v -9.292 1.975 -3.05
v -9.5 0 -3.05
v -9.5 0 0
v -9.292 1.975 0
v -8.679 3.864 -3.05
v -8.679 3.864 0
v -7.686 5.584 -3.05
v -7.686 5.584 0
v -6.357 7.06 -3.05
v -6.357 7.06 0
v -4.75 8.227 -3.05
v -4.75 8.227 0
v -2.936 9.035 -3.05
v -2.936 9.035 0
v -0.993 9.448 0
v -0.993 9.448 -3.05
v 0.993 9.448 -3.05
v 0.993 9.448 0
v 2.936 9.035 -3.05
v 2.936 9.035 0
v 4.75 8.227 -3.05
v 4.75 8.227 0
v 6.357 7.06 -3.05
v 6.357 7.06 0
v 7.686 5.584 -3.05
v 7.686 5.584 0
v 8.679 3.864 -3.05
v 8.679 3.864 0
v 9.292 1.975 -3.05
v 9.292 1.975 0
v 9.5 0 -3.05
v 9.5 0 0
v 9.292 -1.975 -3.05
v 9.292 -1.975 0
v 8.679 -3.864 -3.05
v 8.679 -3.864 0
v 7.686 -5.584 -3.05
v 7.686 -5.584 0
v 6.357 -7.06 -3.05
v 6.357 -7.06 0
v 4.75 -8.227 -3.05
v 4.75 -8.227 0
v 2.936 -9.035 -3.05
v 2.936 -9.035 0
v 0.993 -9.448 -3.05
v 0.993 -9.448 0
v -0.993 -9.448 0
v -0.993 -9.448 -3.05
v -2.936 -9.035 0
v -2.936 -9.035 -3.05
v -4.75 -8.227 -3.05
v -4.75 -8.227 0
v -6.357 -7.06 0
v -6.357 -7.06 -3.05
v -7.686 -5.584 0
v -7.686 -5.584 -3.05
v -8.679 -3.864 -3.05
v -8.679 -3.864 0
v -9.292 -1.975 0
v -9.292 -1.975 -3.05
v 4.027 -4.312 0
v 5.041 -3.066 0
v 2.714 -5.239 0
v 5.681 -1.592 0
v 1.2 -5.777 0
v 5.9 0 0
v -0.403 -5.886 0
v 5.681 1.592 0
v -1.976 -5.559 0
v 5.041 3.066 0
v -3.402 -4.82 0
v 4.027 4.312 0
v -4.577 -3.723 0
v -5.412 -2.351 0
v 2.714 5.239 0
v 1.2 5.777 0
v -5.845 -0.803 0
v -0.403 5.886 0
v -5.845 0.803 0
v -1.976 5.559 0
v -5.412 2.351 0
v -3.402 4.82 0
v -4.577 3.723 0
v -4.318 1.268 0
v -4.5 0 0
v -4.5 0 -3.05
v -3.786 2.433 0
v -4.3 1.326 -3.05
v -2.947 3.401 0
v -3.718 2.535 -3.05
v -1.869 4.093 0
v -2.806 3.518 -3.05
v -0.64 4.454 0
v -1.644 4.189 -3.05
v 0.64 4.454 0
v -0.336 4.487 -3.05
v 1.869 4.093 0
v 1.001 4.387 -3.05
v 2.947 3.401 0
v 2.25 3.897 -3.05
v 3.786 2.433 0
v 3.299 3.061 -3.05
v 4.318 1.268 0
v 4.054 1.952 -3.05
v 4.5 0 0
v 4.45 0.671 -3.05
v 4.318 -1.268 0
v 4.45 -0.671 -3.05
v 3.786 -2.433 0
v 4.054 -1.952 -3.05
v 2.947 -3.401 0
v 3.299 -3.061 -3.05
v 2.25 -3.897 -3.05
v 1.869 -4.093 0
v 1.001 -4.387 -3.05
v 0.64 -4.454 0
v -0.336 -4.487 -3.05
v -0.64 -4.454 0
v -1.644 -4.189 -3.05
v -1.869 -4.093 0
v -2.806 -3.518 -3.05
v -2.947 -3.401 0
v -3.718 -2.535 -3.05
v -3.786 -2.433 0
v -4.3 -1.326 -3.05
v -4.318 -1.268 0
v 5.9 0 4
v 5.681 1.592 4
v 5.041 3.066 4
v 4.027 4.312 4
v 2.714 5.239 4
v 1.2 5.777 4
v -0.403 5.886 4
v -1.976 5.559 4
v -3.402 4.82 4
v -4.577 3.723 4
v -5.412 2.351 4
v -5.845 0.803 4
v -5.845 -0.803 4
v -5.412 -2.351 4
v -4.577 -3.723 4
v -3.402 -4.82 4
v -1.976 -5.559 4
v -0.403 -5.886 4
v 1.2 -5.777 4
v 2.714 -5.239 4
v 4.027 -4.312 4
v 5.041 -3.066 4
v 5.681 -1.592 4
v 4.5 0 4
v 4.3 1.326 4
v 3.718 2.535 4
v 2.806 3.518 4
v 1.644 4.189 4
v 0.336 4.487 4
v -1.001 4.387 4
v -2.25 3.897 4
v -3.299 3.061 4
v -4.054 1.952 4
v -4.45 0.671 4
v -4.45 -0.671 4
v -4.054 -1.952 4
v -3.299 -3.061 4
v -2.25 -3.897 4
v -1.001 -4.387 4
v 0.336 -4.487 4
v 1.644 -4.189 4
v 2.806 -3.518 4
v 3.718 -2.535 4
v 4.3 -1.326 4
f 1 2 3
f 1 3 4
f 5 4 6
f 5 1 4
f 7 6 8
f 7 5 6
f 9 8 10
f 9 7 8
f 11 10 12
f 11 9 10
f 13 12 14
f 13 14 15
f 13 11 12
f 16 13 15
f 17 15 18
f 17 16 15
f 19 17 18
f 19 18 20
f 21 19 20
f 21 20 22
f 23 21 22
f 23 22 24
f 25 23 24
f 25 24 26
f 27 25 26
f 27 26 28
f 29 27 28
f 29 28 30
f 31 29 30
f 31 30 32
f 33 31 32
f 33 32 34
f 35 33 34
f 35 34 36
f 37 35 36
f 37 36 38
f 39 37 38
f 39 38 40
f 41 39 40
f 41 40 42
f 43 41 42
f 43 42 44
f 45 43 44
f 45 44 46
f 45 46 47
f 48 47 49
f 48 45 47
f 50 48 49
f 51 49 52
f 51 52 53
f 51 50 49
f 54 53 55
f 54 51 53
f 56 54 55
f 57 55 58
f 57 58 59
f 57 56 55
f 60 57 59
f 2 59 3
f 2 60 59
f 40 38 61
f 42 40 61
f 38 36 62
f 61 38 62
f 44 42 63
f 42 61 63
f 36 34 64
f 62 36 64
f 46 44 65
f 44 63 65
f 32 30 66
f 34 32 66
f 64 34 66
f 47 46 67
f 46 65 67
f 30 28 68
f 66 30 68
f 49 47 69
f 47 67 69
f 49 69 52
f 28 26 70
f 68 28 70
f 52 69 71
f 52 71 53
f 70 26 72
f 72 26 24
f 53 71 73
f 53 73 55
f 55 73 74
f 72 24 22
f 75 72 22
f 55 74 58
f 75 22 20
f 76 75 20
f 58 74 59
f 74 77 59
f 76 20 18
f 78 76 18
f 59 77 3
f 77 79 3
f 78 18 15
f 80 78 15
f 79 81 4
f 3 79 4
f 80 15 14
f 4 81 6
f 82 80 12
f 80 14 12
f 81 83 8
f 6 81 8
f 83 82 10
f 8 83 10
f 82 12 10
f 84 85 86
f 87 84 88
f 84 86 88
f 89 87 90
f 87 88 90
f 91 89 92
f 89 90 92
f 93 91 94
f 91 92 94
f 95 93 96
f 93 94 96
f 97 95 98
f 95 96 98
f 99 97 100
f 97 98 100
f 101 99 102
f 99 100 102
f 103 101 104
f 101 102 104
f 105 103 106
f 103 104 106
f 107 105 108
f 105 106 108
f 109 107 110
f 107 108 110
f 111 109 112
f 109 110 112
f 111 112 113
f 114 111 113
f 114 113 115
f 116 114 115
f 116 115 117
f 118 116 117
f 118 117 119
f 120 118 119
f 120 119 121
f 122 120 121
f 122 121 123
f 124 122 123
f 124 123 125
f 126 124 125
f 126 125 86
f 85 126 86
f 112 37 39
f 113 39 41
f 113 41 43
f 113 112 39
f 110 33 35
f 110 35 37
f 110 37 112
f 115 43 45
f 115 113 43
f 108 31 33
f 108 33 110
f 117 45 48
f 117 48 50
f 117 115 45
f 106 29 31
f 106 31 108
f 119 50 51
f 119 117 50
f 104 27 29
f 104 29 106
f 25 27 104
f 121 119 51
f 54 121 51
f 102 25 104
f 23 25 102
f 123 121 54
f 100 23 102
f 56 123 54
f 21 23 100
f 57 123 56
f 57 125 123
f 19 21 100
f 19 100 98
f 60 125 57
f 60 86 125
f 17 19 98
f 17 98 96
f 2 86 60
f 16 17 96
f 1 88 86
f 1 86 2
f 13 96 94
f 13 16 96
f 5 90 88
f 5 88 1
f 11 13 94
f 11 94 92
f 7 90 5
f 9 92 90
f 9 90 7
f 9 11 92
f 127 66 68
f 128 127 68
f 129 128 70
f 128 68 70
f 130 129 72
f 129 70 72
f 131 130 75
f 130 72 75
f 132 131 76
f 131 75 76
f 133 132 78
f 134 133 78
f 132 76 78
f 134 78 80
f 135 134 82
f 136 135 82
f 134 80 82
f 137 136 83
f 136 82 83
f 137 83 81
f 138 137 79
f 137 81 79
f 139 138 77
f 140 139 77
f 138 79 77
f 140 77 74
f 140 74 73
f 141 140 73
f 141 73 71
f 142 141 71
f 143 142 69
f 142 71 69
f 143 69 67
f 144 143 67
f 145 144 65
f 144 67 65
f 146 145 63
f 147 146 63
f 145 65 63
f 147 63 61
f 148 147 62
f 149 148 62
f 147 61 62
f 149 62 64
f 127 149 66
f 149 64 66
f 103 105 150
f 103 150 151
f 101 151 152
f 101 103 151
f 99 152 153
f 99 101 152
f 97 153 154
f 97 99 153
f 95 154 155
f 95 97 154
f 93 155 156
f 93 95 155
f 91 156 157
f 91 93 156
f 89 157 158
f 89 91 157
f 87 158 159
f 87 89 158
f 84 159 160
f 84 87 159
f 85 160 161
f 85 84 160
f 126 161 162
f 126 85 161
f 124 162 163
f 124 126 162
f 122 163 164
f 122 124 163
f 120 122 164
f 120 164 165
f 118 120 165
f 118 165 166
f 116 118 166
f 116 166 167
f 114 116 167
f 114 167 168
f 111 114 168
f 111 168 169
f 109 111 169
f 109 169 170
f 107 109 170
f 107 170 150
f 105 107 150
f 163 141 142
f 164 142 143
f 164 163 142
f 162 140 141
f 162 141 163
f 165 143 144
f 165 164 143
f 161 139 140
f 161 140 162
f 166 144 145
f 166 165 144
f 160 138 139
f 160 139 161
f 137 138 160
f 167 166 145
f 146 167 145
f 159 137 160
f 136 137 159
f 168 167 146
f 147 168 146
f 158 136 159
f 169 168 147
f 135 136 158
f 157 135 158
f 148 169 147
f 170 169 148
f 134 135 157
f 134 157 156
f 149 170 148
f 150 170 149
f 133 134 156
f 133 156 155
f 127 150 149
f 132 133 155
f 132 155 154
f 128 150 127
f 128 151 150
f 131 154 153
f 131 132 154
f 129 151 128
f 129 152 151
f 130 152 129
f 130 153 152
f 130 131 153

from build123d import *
from build123d.topology import SkipClean

# Parameters (mm, degrees)
SCHIZZO1_R                   = 5.9
SCHIZZO1_R_2                 = 4.5
ESTRUSIONE_ESTRUSIONE1_DEPTH = 4
ESTRUSIONE_ESTRUSIONE2_START = 4
SCHIZZO2_R                   = 9.5
SCHIZZO2_R_2                 = 4.5
ESTRUSIONE_ESTRUSIONE2_DEPTH = 4
SCHIZZO3_R                   = 9.5
TAGLIO_ESTRUSIONE1_DEPTH     = 0.95


with BuildPart() as part:
    # Schizzo1 → Estrusione-Estrusione1 (new body)
    with BuildSketch(Plane.XY):
        Circle(SCHIZZO1_R)
        Circle(SCHIZZO1_R_2, mode=Mode.SUBTRACT)
    extrude(amount=ESTRUSIONE_ESTRUSIONE1_DEPTH)

    # Schizzo2 → Estrusione-Estrusione2 (add)
    with SkipClean():  # the faces are left unmerged after this step: merging them gives an invalid solid
        with BuildSketch(Plane(origin=(0, 0, 0), x_dir=(-1, 0, 0), z_dir=(0, 0, -1)).offset(ESTRUSIONE_ESTRUSIONE2_START)):
            Circle(SCHIZZO2_R)
            Circle(SCHIZZO2_R_2, mode=Mode.SUBTRACT)
        extrude(amount=-ESTRUSIONE_ESTRUSIONE2_DEPTH)

    # Schizzo3 → Taglio-Estrusione1 (cut)
    with SkipClean():  # the faces are left unmerged after this step: merging them gives an invalid solid
        with BuildSketch(Plane(origin=(0, 0, -4), x_dir=(-1, 0, 0), z_dir=(0, 0, -1))):
            Circle(SCHIZZO3_R)
        extrude(amount=-TAGLIO_ESTRUSIONE1_DEPTH, mode=Mode.SUBTRACT)


solid = part.part
